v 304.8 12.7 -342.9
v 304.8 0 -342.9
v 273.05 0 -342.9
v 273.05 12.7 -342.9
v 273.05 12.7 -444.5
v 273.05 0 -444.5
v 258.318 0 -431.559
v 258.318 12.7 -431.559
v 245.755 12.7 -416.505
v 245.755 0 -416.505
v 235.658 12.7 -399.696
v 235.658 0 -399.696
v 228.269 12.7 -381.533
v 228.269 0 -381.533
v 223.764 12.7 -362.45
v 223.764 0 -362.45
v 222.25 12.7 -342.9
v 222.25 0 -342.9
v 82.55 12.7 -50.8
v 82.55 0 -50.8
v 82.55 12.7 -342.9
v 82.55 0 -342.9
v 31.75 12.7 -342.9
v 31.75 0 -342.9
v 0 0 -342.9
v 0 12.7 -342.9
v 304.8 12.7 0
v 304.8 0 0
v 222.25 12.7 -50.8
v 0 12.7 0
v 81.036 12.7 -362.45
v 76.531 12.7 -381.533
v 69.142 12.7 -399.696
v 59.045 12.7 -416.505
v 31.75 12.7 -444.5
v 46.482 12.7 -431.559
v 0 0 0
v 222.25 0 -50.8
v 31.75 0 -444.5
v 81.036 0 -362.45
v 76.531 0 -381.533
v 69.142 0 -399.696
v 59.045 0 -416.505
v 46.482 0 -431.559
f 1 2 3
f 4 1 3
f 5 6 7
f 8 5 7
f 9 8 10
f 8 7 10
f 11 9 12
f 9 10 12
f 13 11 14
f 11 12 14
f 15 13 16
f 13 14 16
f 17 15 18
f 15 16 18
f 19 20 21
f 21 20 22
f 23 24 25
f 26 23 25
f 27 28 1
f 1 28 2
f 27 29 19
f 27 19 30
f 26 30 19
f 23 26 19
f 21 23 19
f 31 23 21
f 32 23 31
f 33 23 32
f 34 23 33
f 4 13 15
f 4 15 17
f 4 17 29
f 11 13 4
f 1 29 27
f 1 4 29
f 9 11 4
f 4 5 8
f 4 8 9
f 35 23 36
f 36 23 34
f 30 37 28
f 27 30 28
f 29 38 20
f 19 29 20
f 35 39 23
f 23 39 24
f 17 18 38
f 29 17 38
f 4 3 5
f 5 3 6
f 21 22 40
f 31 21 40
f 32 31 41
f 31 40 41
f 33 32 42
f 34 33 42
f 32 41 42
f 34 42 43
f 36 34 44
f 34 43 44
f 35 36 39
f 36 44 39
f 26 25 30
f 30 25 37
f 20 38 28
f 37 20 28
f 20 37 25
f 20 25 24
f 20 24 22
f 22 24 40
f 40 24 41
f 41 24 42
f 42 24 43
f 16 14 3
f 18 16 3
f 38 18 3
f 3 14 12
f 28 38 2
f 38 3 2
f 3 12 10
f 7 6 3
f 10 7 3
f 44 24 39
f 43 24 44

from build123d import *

# Parameters (mm, degrees)
BOSS_EXTRUDE1_DEPTH = 12.7


with BuildPart() as part:
    # Sketch2 → Boss-Extrude1 (new body)
    with BuildSketch(Plane(origin=(0, 0, 0), x_dir=(1, 0, 0), z_dir=(0, 1, 0))):
        with BuildLine():
            Line((0, 0), (304.8, 0))
            Line((304.8, 0), (304.8, 342.9))
            Line((304.8, 342.9), (273.05, 342.9))
            Line((273.05, 342.9), (273.05, 444.5))
            ThreePointArc((273.05, 444.5), (235.657746743, 399.696126628), (222.25, 342.9))
            Line((222.25, 342.9), (222.25, 50.8))
            Line((222.25, 50.8), (82.55, 50.8))
            Line((82.55, 50.8), (82.55, 342.9))
            ThreePointArc((82.55, 342.9), (69.142253257, 399.696126628), (31.75, 444.5))
            Line((31.75, 444.5), (31.75, 342.9))
            Line((31.75, 342.9), (0, 342.9))
            Line((0, 342.9), (0, 0))
        make_face()
    extrude(amount=BOSS_EXTRUDE1_DEPTH)


solid = part.part
